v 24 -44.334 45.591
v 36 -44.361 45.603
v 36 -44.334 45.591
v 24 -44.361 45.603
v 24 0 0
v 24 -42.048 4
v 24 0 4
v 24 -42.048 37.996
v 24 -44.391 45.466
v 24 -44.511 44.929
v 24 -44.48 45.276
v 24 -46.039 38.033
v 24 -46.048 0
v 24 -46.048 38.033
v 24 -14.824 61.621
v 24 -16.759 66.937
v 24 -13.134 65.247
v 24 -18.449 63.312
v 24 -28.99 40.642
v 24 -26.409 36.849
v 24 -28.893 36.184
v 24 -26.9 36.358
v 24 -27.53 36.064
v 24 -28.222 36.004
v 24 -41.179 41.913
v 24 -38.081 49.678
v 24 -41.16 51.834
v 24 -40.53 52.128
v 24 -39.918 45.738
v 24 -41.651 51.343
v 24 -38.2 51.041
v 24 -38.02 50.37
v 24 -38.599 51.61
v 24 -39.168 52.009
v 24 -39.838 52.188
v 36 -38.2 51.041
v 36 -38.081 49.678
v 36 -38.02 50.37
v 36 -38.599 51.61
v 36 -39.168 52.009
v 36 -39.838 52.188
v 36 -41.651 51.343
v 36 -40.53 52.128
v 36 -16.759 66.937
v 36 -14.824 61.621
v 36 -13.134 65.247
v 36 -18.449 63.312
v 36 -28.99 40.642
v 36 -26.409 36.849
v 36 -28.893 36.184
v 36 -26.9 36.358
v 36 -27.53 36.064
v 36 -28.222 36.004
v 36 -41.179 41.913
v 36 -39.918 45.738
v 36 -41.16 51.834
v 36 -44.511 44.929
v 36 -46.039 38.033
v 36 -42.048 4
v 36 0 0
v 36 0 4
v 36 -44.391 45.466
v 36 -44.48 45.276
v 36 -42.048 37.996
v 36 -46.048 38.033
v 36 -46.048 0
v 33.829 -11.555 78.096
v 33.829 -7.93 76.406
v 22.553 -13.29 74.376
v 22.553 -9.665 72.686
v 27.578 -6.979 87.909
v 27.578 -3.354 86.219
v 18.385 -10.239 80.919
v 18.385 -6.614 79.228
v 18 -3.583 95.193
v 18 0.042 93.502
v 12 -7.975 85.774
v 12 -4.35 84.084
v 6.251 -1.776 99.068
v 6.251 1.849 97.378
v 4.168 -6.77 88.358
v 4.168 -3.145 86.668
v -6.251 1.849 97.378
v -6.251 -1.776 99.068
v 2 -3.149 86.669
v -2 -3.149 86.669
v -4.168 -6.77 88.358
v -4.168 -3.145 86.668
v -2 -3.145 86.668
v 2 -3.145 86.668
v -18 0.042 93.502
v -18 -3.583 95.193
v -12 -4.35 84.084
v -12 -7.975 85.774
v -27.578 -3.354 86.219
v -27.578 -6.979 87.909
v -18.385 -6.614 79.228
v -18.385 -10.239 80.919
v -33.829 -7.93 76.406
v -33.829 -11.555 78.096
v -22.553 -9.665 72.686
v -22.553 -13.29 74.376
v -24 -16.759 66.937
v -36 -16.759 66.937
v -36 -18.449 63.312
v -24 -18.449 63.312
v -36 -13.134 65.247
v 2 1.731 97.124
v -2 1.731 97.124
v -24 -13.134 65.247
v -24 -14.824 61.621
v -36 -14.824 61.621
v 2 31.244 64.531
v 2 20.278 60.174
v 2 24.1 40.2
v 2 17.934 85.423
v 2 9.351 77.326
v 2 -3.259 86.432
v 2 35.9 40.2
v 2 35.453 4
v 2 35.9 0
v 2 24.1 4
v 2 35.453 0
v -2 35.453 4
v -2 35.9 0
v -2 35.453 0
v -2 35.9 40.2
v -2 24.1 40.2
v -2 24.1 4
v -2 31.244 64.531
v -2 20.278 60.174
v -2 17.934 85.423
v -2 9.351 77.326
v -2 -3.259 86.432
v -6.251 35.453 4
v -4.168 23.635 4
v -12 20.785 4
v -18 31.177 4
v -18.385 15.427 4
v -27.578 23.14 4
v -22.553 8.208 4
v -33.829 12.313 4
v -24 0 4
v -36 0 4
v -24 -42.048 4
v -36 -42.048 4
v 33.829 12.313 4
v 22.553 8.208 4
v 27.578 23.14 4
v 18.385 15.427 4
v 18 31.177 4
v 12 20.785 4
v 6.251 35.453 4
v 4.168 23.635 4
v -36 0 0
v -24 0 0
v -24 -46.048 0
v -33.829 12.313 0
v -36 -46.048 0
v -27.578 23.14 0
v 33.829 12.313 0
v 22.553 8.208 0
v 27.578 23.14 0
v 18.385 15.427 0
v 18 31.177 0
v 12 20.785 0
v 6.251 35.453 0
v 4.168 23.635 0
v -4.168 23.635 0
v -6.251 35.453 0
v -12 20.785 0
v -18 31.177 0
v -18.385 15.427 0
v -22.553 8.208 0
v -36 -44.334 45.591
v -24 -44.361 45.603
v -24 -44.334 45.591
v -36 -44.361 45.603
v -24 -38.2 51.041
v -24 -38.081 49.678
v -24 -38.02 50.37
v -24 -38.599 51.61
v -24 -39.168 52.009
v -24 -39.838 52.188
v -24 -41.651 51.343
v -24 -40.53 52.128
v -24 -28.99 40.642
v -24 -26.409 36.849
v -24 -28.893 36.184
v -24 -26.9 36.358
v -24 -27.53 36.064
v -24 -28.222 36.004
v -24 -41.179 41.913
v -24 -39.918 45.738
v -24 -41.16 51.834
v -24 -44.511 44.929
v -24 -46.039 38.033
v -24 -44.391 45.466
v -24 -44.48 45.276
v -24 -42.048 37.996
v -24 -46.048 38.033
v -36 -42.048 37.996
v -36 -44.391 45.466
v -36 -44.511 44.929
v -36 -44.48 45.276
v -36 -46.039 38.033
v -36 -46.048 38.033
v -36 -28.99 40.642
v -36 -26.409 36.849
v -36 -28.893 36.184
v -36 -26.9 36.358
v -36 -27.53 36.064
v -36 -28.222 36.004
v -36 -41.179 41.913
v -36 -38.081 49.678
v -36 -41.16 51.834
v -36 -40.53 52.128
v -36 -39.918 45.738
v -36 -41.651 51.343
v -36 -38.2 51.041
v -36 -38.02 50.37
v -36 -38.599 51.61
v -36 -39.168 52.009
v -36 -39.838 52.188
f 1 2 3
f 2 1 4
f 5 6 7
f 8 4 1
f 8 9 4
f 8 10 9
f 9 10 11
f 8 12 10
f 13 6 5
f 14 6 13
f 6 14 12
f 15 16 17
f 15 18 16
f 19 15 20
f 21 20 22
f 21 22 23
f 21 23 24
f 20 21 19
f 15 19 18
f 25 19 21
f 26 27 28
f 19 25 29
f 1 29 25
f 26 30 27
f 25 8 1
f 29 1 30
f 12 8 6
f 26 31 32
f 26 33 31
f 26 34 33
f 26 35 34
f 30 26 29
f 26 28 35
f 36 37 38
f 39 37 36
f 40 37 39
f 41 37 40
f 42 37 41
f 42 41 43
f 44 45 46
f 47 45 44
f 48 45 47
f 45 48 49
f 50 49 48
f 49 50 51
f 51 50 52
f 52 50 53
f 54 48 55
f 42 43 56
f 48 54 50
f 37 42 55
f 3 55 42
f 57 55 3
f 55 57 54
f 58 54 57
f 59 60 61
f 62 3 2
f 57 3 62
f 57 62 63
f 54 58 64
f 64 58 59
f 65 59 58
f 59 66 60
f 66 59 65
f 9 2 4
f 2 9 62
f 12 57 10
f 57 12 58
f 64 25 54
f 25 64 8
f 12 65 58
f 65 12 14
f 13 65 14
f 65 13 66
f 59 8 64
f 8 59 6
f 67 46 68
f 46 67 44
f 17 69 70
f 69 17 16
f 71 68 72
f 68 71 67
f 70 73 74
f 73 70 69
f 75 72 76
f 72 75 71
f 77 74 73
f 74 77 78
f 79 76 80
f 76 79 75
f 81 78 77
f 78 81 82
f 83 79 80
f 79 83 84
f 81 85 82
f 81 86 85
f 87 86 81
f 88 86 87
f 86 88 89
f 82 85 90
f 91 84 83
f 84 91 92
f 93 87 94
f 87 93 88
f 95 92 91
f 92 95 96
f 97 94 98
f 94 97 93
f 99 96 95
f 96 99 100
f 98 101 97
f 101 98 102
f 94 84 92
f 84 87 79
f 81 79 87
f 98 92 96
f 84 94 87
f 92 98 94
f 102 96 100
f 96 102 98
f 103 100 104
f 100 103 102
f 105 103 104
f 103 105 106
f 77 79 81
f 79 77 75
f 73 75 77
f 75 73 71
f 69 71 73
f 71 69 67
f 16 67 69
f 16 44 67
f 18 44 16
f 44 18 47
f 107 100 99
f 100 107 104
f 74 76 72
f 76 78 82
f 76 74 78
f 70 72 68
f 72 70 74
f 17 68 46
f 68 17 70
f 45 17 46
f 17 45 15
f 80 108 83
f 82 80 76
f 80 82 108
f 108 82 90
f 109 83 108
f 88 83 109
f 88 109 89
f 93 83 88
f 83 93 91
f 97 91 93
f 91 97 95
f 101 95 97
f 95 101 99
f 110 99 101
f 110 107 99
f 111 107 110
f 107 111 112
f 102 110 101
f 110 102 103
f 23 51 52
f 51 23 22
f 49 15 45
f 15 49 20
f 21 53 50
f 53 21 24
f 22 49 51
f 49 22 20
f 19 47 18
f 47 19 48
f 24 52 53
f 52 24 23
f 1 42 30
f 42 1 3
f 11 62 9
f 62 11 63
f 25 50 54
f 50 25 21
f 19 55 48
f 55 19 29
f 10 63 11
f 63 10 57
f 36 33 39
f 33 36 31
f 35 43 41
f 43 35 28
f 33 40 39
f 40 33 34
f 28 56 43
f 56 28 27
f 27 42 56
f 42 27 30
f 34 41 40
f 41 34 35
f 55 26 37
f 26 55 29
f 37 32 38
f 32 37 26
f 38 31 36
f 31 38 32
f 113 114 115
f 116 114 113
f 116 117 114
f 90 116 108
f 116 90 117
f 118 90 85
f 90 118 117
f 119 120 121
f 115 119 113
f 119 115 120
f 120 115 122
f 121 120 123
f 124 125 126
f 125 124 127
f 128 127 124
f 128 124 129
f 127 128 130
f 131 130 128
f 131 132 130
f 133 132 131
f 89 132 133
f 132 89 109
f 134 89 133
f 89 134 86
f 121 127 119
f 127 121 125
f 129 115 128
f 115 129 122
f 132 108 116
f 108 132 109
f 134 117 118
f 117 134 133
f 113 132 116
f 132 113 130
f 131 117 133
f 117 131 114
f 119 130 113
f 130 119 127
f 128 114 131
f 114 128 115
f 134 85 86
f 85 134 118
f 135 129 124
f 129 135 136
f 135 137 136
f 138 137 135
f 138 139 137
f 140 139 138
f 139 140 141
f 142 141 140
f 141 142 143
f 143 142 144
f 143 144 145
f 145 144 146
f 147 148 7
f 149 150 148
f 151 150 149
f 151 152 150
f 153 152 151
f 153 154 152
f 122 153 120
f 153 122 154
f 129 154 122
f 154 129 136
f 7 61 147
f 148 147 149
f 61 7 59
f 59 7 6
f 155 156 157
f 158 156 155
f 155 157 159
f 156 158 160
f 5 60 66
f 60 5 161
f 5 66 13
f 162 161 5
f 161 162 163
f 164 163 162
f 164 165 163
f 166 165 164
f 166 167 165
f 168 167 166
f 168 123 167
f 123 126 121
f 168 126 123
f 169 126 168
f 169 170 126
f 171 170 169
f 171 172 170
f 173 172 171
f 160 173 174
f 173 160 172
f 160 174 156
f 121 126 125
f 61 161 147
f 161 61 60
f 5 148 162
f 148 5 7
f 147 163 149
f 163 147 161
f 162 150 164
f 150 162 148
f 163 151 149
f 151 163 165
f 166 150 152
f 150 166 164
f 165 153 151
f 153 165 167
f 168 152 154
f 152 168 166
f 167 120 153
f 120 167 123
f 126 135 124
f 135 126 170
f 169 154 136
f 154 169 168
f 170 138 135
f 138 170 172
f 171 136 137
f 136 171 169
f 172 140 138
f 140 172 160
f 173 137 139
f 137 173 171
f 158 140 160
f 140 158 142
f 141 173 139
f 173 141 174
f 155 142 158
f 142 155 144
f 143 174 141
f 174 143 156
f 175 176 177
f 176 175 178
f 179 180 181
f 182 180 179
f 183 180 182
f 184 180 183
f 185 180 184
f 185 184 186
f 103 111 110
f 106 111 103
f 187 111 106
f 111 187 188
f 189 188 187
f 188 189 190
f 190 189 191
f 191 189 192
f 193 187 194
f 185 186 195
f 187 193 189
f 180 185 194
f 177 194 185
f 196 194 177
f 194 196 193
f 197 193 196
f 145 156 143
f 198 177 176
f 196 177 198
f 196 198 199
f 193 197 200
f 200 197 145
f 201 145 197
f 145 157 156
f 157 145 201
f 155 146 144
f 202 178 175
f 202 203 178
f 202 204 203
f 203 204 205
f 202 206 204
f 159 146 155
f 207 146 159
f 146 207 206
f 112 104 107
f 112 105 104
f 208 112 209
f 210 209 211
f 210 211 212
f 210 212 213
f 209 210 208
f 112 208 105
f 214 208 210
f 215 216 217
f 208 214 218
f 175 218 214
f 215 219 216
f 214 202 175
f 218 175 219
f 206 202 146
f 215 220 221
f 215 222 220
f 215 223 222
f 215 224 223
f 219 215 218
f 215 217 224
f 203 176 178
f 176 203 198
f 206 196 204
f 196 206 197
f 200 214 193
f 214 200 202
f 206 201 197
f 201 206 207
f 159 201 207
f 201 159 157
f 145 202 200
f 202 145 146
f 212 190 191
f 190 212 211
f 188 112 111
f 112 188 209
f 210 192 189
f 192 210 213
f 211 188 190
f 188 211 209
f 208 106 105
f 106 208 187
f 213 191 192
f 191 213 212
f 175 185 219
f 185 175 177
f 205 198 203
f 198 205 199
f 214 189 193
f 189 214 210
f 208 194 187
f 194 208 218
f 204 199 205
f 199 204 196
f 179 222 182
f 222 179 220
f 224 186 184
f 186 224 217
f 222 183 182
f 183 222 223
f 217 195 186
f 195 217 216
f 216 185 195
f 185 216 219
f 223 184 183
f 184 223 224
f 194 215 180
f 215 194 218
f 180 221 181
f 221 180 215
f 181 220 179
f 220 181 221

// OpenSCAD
fragments= 18;
isPhoneV = false;
isPhoneH = false;
isBar = false;


module bar(y, z) {
    translate([30, y, z])
    rotate([0, 90, 0])
    cylinder(h=12, r=2, center=true, $fn=fragments);
}

module bar0(y, z) {
    translate([0, y, z])
    rotate([0, 90, 0])
    cylinder(h=12, r=2, center=true, $fn=fragments);
}


module arm() {
    a = -64;
    x = 64;
    translate([0, -1, 96])
    rotate([-25, 0, 0])
    union() {
        translate([0, 0, -33])
        rotate([90, 0, 0])
        rotate_extrude(angle=180, convexity=10, $fn=fragments) {
            translate([30, 0, 0])
            square([12, 4], center=true);
        }
        hull() {
            translate([30, 0, -35])
            cube([12, 4, 4], center=true);
            bar(0, a);
        }
        hull() {
            bar(0, -x);
            bar(-16, -x);
        }
        hull() {
            bar(-16, -x + 6);
            bar(-16, -x);
        }
        union() {
            translate([30, 0, -64])
            rotate([-90, 0, 0])
            rotate([0, 90, 0])
            rotate_extrude(angle=25, convexity=10, $fn=fragments) {
                translate([16, 0, 0])
                square([4, 12], center=true);
            }
            translate([30, 0, -101.86])
            rotate([25, 0, 0])
            cube([12, 4, 68.7], center=true);
        }
        // translate([0, -16, -x])
        // hull() {
        //     bar(0, 0);
        //     rotate([25, 0, 0])
        //     bar(0, -120);
        // }



        // hull() {
        //     bar(0, -35);
        //     rotate([24.4, 0, 0])
        //     bar(0, -94);
        // }
    }
    l = 44;
    translate([30, -(l / 2), 2])
    cube([12, l, 4], center=true);

    translate([0, 0, 2])
    rotate_extrude(angle=180, convexity=10, $fn=fragments) {
        translate([30, 0, 0])
        square([12, 4], center=true);
    }
    
    difference() {
        // translate([0, 11.2, 50])
        // rotate([18, 0, 0])
        // #cube([12, 4, 120], center=true);
        translate([0, 30, 78])
        union() {
            // hull() {
            //     rotate([65, 0, 0])
            //     bar0(0, 40);
            //     bar0(0, 0);
            // }
            // hull() {
            //     bar0(0, -80);
            //     bar0(0, 0);
            // }
            translate([0, 0, -77.8])
            cube([4, 11.8, 80], center=true);
            translate([0, -60, -37.8])
            rotate([-25, 0, 0])
            rotate([0, 270, 0])
            rotate_extrude(angle=65, convexity=10, $fn=fragments) {
                translate([60, 0, 0])
                square([11.8, 4], center=true);
            }
            
        }
        

        translate([0, -19, 100])
        rotate([65, 0, 0])
        cube([40, 40, 40], center=true);
    }
    
    
}

module core() {
    union() {
        difference() {
            union() {
                arm();
                mirror([1, 0, 0])
                arm();
                
                
            }
            translate([0, 0, -60])
            cube([120, 120, 120], center=true);
        }
    };
}
core();

if (isPhoneV) {
    translate([0, -2, 112])
    rotate([-25, 0, 0])
    cube([72, 10, 148], center=true);
}


if (isPhoneH) {
    translate([0, -18, 78])
    rotate([-25, 0, 0])
    cube([148, 10, 72], center=true);
}

if (isBar) {
    translate([20, 58, 0])
    cube([200, 10, 10], center=true);
    translate([20, -41, 0])
    cube([200, 10, 10], center=true);
}
